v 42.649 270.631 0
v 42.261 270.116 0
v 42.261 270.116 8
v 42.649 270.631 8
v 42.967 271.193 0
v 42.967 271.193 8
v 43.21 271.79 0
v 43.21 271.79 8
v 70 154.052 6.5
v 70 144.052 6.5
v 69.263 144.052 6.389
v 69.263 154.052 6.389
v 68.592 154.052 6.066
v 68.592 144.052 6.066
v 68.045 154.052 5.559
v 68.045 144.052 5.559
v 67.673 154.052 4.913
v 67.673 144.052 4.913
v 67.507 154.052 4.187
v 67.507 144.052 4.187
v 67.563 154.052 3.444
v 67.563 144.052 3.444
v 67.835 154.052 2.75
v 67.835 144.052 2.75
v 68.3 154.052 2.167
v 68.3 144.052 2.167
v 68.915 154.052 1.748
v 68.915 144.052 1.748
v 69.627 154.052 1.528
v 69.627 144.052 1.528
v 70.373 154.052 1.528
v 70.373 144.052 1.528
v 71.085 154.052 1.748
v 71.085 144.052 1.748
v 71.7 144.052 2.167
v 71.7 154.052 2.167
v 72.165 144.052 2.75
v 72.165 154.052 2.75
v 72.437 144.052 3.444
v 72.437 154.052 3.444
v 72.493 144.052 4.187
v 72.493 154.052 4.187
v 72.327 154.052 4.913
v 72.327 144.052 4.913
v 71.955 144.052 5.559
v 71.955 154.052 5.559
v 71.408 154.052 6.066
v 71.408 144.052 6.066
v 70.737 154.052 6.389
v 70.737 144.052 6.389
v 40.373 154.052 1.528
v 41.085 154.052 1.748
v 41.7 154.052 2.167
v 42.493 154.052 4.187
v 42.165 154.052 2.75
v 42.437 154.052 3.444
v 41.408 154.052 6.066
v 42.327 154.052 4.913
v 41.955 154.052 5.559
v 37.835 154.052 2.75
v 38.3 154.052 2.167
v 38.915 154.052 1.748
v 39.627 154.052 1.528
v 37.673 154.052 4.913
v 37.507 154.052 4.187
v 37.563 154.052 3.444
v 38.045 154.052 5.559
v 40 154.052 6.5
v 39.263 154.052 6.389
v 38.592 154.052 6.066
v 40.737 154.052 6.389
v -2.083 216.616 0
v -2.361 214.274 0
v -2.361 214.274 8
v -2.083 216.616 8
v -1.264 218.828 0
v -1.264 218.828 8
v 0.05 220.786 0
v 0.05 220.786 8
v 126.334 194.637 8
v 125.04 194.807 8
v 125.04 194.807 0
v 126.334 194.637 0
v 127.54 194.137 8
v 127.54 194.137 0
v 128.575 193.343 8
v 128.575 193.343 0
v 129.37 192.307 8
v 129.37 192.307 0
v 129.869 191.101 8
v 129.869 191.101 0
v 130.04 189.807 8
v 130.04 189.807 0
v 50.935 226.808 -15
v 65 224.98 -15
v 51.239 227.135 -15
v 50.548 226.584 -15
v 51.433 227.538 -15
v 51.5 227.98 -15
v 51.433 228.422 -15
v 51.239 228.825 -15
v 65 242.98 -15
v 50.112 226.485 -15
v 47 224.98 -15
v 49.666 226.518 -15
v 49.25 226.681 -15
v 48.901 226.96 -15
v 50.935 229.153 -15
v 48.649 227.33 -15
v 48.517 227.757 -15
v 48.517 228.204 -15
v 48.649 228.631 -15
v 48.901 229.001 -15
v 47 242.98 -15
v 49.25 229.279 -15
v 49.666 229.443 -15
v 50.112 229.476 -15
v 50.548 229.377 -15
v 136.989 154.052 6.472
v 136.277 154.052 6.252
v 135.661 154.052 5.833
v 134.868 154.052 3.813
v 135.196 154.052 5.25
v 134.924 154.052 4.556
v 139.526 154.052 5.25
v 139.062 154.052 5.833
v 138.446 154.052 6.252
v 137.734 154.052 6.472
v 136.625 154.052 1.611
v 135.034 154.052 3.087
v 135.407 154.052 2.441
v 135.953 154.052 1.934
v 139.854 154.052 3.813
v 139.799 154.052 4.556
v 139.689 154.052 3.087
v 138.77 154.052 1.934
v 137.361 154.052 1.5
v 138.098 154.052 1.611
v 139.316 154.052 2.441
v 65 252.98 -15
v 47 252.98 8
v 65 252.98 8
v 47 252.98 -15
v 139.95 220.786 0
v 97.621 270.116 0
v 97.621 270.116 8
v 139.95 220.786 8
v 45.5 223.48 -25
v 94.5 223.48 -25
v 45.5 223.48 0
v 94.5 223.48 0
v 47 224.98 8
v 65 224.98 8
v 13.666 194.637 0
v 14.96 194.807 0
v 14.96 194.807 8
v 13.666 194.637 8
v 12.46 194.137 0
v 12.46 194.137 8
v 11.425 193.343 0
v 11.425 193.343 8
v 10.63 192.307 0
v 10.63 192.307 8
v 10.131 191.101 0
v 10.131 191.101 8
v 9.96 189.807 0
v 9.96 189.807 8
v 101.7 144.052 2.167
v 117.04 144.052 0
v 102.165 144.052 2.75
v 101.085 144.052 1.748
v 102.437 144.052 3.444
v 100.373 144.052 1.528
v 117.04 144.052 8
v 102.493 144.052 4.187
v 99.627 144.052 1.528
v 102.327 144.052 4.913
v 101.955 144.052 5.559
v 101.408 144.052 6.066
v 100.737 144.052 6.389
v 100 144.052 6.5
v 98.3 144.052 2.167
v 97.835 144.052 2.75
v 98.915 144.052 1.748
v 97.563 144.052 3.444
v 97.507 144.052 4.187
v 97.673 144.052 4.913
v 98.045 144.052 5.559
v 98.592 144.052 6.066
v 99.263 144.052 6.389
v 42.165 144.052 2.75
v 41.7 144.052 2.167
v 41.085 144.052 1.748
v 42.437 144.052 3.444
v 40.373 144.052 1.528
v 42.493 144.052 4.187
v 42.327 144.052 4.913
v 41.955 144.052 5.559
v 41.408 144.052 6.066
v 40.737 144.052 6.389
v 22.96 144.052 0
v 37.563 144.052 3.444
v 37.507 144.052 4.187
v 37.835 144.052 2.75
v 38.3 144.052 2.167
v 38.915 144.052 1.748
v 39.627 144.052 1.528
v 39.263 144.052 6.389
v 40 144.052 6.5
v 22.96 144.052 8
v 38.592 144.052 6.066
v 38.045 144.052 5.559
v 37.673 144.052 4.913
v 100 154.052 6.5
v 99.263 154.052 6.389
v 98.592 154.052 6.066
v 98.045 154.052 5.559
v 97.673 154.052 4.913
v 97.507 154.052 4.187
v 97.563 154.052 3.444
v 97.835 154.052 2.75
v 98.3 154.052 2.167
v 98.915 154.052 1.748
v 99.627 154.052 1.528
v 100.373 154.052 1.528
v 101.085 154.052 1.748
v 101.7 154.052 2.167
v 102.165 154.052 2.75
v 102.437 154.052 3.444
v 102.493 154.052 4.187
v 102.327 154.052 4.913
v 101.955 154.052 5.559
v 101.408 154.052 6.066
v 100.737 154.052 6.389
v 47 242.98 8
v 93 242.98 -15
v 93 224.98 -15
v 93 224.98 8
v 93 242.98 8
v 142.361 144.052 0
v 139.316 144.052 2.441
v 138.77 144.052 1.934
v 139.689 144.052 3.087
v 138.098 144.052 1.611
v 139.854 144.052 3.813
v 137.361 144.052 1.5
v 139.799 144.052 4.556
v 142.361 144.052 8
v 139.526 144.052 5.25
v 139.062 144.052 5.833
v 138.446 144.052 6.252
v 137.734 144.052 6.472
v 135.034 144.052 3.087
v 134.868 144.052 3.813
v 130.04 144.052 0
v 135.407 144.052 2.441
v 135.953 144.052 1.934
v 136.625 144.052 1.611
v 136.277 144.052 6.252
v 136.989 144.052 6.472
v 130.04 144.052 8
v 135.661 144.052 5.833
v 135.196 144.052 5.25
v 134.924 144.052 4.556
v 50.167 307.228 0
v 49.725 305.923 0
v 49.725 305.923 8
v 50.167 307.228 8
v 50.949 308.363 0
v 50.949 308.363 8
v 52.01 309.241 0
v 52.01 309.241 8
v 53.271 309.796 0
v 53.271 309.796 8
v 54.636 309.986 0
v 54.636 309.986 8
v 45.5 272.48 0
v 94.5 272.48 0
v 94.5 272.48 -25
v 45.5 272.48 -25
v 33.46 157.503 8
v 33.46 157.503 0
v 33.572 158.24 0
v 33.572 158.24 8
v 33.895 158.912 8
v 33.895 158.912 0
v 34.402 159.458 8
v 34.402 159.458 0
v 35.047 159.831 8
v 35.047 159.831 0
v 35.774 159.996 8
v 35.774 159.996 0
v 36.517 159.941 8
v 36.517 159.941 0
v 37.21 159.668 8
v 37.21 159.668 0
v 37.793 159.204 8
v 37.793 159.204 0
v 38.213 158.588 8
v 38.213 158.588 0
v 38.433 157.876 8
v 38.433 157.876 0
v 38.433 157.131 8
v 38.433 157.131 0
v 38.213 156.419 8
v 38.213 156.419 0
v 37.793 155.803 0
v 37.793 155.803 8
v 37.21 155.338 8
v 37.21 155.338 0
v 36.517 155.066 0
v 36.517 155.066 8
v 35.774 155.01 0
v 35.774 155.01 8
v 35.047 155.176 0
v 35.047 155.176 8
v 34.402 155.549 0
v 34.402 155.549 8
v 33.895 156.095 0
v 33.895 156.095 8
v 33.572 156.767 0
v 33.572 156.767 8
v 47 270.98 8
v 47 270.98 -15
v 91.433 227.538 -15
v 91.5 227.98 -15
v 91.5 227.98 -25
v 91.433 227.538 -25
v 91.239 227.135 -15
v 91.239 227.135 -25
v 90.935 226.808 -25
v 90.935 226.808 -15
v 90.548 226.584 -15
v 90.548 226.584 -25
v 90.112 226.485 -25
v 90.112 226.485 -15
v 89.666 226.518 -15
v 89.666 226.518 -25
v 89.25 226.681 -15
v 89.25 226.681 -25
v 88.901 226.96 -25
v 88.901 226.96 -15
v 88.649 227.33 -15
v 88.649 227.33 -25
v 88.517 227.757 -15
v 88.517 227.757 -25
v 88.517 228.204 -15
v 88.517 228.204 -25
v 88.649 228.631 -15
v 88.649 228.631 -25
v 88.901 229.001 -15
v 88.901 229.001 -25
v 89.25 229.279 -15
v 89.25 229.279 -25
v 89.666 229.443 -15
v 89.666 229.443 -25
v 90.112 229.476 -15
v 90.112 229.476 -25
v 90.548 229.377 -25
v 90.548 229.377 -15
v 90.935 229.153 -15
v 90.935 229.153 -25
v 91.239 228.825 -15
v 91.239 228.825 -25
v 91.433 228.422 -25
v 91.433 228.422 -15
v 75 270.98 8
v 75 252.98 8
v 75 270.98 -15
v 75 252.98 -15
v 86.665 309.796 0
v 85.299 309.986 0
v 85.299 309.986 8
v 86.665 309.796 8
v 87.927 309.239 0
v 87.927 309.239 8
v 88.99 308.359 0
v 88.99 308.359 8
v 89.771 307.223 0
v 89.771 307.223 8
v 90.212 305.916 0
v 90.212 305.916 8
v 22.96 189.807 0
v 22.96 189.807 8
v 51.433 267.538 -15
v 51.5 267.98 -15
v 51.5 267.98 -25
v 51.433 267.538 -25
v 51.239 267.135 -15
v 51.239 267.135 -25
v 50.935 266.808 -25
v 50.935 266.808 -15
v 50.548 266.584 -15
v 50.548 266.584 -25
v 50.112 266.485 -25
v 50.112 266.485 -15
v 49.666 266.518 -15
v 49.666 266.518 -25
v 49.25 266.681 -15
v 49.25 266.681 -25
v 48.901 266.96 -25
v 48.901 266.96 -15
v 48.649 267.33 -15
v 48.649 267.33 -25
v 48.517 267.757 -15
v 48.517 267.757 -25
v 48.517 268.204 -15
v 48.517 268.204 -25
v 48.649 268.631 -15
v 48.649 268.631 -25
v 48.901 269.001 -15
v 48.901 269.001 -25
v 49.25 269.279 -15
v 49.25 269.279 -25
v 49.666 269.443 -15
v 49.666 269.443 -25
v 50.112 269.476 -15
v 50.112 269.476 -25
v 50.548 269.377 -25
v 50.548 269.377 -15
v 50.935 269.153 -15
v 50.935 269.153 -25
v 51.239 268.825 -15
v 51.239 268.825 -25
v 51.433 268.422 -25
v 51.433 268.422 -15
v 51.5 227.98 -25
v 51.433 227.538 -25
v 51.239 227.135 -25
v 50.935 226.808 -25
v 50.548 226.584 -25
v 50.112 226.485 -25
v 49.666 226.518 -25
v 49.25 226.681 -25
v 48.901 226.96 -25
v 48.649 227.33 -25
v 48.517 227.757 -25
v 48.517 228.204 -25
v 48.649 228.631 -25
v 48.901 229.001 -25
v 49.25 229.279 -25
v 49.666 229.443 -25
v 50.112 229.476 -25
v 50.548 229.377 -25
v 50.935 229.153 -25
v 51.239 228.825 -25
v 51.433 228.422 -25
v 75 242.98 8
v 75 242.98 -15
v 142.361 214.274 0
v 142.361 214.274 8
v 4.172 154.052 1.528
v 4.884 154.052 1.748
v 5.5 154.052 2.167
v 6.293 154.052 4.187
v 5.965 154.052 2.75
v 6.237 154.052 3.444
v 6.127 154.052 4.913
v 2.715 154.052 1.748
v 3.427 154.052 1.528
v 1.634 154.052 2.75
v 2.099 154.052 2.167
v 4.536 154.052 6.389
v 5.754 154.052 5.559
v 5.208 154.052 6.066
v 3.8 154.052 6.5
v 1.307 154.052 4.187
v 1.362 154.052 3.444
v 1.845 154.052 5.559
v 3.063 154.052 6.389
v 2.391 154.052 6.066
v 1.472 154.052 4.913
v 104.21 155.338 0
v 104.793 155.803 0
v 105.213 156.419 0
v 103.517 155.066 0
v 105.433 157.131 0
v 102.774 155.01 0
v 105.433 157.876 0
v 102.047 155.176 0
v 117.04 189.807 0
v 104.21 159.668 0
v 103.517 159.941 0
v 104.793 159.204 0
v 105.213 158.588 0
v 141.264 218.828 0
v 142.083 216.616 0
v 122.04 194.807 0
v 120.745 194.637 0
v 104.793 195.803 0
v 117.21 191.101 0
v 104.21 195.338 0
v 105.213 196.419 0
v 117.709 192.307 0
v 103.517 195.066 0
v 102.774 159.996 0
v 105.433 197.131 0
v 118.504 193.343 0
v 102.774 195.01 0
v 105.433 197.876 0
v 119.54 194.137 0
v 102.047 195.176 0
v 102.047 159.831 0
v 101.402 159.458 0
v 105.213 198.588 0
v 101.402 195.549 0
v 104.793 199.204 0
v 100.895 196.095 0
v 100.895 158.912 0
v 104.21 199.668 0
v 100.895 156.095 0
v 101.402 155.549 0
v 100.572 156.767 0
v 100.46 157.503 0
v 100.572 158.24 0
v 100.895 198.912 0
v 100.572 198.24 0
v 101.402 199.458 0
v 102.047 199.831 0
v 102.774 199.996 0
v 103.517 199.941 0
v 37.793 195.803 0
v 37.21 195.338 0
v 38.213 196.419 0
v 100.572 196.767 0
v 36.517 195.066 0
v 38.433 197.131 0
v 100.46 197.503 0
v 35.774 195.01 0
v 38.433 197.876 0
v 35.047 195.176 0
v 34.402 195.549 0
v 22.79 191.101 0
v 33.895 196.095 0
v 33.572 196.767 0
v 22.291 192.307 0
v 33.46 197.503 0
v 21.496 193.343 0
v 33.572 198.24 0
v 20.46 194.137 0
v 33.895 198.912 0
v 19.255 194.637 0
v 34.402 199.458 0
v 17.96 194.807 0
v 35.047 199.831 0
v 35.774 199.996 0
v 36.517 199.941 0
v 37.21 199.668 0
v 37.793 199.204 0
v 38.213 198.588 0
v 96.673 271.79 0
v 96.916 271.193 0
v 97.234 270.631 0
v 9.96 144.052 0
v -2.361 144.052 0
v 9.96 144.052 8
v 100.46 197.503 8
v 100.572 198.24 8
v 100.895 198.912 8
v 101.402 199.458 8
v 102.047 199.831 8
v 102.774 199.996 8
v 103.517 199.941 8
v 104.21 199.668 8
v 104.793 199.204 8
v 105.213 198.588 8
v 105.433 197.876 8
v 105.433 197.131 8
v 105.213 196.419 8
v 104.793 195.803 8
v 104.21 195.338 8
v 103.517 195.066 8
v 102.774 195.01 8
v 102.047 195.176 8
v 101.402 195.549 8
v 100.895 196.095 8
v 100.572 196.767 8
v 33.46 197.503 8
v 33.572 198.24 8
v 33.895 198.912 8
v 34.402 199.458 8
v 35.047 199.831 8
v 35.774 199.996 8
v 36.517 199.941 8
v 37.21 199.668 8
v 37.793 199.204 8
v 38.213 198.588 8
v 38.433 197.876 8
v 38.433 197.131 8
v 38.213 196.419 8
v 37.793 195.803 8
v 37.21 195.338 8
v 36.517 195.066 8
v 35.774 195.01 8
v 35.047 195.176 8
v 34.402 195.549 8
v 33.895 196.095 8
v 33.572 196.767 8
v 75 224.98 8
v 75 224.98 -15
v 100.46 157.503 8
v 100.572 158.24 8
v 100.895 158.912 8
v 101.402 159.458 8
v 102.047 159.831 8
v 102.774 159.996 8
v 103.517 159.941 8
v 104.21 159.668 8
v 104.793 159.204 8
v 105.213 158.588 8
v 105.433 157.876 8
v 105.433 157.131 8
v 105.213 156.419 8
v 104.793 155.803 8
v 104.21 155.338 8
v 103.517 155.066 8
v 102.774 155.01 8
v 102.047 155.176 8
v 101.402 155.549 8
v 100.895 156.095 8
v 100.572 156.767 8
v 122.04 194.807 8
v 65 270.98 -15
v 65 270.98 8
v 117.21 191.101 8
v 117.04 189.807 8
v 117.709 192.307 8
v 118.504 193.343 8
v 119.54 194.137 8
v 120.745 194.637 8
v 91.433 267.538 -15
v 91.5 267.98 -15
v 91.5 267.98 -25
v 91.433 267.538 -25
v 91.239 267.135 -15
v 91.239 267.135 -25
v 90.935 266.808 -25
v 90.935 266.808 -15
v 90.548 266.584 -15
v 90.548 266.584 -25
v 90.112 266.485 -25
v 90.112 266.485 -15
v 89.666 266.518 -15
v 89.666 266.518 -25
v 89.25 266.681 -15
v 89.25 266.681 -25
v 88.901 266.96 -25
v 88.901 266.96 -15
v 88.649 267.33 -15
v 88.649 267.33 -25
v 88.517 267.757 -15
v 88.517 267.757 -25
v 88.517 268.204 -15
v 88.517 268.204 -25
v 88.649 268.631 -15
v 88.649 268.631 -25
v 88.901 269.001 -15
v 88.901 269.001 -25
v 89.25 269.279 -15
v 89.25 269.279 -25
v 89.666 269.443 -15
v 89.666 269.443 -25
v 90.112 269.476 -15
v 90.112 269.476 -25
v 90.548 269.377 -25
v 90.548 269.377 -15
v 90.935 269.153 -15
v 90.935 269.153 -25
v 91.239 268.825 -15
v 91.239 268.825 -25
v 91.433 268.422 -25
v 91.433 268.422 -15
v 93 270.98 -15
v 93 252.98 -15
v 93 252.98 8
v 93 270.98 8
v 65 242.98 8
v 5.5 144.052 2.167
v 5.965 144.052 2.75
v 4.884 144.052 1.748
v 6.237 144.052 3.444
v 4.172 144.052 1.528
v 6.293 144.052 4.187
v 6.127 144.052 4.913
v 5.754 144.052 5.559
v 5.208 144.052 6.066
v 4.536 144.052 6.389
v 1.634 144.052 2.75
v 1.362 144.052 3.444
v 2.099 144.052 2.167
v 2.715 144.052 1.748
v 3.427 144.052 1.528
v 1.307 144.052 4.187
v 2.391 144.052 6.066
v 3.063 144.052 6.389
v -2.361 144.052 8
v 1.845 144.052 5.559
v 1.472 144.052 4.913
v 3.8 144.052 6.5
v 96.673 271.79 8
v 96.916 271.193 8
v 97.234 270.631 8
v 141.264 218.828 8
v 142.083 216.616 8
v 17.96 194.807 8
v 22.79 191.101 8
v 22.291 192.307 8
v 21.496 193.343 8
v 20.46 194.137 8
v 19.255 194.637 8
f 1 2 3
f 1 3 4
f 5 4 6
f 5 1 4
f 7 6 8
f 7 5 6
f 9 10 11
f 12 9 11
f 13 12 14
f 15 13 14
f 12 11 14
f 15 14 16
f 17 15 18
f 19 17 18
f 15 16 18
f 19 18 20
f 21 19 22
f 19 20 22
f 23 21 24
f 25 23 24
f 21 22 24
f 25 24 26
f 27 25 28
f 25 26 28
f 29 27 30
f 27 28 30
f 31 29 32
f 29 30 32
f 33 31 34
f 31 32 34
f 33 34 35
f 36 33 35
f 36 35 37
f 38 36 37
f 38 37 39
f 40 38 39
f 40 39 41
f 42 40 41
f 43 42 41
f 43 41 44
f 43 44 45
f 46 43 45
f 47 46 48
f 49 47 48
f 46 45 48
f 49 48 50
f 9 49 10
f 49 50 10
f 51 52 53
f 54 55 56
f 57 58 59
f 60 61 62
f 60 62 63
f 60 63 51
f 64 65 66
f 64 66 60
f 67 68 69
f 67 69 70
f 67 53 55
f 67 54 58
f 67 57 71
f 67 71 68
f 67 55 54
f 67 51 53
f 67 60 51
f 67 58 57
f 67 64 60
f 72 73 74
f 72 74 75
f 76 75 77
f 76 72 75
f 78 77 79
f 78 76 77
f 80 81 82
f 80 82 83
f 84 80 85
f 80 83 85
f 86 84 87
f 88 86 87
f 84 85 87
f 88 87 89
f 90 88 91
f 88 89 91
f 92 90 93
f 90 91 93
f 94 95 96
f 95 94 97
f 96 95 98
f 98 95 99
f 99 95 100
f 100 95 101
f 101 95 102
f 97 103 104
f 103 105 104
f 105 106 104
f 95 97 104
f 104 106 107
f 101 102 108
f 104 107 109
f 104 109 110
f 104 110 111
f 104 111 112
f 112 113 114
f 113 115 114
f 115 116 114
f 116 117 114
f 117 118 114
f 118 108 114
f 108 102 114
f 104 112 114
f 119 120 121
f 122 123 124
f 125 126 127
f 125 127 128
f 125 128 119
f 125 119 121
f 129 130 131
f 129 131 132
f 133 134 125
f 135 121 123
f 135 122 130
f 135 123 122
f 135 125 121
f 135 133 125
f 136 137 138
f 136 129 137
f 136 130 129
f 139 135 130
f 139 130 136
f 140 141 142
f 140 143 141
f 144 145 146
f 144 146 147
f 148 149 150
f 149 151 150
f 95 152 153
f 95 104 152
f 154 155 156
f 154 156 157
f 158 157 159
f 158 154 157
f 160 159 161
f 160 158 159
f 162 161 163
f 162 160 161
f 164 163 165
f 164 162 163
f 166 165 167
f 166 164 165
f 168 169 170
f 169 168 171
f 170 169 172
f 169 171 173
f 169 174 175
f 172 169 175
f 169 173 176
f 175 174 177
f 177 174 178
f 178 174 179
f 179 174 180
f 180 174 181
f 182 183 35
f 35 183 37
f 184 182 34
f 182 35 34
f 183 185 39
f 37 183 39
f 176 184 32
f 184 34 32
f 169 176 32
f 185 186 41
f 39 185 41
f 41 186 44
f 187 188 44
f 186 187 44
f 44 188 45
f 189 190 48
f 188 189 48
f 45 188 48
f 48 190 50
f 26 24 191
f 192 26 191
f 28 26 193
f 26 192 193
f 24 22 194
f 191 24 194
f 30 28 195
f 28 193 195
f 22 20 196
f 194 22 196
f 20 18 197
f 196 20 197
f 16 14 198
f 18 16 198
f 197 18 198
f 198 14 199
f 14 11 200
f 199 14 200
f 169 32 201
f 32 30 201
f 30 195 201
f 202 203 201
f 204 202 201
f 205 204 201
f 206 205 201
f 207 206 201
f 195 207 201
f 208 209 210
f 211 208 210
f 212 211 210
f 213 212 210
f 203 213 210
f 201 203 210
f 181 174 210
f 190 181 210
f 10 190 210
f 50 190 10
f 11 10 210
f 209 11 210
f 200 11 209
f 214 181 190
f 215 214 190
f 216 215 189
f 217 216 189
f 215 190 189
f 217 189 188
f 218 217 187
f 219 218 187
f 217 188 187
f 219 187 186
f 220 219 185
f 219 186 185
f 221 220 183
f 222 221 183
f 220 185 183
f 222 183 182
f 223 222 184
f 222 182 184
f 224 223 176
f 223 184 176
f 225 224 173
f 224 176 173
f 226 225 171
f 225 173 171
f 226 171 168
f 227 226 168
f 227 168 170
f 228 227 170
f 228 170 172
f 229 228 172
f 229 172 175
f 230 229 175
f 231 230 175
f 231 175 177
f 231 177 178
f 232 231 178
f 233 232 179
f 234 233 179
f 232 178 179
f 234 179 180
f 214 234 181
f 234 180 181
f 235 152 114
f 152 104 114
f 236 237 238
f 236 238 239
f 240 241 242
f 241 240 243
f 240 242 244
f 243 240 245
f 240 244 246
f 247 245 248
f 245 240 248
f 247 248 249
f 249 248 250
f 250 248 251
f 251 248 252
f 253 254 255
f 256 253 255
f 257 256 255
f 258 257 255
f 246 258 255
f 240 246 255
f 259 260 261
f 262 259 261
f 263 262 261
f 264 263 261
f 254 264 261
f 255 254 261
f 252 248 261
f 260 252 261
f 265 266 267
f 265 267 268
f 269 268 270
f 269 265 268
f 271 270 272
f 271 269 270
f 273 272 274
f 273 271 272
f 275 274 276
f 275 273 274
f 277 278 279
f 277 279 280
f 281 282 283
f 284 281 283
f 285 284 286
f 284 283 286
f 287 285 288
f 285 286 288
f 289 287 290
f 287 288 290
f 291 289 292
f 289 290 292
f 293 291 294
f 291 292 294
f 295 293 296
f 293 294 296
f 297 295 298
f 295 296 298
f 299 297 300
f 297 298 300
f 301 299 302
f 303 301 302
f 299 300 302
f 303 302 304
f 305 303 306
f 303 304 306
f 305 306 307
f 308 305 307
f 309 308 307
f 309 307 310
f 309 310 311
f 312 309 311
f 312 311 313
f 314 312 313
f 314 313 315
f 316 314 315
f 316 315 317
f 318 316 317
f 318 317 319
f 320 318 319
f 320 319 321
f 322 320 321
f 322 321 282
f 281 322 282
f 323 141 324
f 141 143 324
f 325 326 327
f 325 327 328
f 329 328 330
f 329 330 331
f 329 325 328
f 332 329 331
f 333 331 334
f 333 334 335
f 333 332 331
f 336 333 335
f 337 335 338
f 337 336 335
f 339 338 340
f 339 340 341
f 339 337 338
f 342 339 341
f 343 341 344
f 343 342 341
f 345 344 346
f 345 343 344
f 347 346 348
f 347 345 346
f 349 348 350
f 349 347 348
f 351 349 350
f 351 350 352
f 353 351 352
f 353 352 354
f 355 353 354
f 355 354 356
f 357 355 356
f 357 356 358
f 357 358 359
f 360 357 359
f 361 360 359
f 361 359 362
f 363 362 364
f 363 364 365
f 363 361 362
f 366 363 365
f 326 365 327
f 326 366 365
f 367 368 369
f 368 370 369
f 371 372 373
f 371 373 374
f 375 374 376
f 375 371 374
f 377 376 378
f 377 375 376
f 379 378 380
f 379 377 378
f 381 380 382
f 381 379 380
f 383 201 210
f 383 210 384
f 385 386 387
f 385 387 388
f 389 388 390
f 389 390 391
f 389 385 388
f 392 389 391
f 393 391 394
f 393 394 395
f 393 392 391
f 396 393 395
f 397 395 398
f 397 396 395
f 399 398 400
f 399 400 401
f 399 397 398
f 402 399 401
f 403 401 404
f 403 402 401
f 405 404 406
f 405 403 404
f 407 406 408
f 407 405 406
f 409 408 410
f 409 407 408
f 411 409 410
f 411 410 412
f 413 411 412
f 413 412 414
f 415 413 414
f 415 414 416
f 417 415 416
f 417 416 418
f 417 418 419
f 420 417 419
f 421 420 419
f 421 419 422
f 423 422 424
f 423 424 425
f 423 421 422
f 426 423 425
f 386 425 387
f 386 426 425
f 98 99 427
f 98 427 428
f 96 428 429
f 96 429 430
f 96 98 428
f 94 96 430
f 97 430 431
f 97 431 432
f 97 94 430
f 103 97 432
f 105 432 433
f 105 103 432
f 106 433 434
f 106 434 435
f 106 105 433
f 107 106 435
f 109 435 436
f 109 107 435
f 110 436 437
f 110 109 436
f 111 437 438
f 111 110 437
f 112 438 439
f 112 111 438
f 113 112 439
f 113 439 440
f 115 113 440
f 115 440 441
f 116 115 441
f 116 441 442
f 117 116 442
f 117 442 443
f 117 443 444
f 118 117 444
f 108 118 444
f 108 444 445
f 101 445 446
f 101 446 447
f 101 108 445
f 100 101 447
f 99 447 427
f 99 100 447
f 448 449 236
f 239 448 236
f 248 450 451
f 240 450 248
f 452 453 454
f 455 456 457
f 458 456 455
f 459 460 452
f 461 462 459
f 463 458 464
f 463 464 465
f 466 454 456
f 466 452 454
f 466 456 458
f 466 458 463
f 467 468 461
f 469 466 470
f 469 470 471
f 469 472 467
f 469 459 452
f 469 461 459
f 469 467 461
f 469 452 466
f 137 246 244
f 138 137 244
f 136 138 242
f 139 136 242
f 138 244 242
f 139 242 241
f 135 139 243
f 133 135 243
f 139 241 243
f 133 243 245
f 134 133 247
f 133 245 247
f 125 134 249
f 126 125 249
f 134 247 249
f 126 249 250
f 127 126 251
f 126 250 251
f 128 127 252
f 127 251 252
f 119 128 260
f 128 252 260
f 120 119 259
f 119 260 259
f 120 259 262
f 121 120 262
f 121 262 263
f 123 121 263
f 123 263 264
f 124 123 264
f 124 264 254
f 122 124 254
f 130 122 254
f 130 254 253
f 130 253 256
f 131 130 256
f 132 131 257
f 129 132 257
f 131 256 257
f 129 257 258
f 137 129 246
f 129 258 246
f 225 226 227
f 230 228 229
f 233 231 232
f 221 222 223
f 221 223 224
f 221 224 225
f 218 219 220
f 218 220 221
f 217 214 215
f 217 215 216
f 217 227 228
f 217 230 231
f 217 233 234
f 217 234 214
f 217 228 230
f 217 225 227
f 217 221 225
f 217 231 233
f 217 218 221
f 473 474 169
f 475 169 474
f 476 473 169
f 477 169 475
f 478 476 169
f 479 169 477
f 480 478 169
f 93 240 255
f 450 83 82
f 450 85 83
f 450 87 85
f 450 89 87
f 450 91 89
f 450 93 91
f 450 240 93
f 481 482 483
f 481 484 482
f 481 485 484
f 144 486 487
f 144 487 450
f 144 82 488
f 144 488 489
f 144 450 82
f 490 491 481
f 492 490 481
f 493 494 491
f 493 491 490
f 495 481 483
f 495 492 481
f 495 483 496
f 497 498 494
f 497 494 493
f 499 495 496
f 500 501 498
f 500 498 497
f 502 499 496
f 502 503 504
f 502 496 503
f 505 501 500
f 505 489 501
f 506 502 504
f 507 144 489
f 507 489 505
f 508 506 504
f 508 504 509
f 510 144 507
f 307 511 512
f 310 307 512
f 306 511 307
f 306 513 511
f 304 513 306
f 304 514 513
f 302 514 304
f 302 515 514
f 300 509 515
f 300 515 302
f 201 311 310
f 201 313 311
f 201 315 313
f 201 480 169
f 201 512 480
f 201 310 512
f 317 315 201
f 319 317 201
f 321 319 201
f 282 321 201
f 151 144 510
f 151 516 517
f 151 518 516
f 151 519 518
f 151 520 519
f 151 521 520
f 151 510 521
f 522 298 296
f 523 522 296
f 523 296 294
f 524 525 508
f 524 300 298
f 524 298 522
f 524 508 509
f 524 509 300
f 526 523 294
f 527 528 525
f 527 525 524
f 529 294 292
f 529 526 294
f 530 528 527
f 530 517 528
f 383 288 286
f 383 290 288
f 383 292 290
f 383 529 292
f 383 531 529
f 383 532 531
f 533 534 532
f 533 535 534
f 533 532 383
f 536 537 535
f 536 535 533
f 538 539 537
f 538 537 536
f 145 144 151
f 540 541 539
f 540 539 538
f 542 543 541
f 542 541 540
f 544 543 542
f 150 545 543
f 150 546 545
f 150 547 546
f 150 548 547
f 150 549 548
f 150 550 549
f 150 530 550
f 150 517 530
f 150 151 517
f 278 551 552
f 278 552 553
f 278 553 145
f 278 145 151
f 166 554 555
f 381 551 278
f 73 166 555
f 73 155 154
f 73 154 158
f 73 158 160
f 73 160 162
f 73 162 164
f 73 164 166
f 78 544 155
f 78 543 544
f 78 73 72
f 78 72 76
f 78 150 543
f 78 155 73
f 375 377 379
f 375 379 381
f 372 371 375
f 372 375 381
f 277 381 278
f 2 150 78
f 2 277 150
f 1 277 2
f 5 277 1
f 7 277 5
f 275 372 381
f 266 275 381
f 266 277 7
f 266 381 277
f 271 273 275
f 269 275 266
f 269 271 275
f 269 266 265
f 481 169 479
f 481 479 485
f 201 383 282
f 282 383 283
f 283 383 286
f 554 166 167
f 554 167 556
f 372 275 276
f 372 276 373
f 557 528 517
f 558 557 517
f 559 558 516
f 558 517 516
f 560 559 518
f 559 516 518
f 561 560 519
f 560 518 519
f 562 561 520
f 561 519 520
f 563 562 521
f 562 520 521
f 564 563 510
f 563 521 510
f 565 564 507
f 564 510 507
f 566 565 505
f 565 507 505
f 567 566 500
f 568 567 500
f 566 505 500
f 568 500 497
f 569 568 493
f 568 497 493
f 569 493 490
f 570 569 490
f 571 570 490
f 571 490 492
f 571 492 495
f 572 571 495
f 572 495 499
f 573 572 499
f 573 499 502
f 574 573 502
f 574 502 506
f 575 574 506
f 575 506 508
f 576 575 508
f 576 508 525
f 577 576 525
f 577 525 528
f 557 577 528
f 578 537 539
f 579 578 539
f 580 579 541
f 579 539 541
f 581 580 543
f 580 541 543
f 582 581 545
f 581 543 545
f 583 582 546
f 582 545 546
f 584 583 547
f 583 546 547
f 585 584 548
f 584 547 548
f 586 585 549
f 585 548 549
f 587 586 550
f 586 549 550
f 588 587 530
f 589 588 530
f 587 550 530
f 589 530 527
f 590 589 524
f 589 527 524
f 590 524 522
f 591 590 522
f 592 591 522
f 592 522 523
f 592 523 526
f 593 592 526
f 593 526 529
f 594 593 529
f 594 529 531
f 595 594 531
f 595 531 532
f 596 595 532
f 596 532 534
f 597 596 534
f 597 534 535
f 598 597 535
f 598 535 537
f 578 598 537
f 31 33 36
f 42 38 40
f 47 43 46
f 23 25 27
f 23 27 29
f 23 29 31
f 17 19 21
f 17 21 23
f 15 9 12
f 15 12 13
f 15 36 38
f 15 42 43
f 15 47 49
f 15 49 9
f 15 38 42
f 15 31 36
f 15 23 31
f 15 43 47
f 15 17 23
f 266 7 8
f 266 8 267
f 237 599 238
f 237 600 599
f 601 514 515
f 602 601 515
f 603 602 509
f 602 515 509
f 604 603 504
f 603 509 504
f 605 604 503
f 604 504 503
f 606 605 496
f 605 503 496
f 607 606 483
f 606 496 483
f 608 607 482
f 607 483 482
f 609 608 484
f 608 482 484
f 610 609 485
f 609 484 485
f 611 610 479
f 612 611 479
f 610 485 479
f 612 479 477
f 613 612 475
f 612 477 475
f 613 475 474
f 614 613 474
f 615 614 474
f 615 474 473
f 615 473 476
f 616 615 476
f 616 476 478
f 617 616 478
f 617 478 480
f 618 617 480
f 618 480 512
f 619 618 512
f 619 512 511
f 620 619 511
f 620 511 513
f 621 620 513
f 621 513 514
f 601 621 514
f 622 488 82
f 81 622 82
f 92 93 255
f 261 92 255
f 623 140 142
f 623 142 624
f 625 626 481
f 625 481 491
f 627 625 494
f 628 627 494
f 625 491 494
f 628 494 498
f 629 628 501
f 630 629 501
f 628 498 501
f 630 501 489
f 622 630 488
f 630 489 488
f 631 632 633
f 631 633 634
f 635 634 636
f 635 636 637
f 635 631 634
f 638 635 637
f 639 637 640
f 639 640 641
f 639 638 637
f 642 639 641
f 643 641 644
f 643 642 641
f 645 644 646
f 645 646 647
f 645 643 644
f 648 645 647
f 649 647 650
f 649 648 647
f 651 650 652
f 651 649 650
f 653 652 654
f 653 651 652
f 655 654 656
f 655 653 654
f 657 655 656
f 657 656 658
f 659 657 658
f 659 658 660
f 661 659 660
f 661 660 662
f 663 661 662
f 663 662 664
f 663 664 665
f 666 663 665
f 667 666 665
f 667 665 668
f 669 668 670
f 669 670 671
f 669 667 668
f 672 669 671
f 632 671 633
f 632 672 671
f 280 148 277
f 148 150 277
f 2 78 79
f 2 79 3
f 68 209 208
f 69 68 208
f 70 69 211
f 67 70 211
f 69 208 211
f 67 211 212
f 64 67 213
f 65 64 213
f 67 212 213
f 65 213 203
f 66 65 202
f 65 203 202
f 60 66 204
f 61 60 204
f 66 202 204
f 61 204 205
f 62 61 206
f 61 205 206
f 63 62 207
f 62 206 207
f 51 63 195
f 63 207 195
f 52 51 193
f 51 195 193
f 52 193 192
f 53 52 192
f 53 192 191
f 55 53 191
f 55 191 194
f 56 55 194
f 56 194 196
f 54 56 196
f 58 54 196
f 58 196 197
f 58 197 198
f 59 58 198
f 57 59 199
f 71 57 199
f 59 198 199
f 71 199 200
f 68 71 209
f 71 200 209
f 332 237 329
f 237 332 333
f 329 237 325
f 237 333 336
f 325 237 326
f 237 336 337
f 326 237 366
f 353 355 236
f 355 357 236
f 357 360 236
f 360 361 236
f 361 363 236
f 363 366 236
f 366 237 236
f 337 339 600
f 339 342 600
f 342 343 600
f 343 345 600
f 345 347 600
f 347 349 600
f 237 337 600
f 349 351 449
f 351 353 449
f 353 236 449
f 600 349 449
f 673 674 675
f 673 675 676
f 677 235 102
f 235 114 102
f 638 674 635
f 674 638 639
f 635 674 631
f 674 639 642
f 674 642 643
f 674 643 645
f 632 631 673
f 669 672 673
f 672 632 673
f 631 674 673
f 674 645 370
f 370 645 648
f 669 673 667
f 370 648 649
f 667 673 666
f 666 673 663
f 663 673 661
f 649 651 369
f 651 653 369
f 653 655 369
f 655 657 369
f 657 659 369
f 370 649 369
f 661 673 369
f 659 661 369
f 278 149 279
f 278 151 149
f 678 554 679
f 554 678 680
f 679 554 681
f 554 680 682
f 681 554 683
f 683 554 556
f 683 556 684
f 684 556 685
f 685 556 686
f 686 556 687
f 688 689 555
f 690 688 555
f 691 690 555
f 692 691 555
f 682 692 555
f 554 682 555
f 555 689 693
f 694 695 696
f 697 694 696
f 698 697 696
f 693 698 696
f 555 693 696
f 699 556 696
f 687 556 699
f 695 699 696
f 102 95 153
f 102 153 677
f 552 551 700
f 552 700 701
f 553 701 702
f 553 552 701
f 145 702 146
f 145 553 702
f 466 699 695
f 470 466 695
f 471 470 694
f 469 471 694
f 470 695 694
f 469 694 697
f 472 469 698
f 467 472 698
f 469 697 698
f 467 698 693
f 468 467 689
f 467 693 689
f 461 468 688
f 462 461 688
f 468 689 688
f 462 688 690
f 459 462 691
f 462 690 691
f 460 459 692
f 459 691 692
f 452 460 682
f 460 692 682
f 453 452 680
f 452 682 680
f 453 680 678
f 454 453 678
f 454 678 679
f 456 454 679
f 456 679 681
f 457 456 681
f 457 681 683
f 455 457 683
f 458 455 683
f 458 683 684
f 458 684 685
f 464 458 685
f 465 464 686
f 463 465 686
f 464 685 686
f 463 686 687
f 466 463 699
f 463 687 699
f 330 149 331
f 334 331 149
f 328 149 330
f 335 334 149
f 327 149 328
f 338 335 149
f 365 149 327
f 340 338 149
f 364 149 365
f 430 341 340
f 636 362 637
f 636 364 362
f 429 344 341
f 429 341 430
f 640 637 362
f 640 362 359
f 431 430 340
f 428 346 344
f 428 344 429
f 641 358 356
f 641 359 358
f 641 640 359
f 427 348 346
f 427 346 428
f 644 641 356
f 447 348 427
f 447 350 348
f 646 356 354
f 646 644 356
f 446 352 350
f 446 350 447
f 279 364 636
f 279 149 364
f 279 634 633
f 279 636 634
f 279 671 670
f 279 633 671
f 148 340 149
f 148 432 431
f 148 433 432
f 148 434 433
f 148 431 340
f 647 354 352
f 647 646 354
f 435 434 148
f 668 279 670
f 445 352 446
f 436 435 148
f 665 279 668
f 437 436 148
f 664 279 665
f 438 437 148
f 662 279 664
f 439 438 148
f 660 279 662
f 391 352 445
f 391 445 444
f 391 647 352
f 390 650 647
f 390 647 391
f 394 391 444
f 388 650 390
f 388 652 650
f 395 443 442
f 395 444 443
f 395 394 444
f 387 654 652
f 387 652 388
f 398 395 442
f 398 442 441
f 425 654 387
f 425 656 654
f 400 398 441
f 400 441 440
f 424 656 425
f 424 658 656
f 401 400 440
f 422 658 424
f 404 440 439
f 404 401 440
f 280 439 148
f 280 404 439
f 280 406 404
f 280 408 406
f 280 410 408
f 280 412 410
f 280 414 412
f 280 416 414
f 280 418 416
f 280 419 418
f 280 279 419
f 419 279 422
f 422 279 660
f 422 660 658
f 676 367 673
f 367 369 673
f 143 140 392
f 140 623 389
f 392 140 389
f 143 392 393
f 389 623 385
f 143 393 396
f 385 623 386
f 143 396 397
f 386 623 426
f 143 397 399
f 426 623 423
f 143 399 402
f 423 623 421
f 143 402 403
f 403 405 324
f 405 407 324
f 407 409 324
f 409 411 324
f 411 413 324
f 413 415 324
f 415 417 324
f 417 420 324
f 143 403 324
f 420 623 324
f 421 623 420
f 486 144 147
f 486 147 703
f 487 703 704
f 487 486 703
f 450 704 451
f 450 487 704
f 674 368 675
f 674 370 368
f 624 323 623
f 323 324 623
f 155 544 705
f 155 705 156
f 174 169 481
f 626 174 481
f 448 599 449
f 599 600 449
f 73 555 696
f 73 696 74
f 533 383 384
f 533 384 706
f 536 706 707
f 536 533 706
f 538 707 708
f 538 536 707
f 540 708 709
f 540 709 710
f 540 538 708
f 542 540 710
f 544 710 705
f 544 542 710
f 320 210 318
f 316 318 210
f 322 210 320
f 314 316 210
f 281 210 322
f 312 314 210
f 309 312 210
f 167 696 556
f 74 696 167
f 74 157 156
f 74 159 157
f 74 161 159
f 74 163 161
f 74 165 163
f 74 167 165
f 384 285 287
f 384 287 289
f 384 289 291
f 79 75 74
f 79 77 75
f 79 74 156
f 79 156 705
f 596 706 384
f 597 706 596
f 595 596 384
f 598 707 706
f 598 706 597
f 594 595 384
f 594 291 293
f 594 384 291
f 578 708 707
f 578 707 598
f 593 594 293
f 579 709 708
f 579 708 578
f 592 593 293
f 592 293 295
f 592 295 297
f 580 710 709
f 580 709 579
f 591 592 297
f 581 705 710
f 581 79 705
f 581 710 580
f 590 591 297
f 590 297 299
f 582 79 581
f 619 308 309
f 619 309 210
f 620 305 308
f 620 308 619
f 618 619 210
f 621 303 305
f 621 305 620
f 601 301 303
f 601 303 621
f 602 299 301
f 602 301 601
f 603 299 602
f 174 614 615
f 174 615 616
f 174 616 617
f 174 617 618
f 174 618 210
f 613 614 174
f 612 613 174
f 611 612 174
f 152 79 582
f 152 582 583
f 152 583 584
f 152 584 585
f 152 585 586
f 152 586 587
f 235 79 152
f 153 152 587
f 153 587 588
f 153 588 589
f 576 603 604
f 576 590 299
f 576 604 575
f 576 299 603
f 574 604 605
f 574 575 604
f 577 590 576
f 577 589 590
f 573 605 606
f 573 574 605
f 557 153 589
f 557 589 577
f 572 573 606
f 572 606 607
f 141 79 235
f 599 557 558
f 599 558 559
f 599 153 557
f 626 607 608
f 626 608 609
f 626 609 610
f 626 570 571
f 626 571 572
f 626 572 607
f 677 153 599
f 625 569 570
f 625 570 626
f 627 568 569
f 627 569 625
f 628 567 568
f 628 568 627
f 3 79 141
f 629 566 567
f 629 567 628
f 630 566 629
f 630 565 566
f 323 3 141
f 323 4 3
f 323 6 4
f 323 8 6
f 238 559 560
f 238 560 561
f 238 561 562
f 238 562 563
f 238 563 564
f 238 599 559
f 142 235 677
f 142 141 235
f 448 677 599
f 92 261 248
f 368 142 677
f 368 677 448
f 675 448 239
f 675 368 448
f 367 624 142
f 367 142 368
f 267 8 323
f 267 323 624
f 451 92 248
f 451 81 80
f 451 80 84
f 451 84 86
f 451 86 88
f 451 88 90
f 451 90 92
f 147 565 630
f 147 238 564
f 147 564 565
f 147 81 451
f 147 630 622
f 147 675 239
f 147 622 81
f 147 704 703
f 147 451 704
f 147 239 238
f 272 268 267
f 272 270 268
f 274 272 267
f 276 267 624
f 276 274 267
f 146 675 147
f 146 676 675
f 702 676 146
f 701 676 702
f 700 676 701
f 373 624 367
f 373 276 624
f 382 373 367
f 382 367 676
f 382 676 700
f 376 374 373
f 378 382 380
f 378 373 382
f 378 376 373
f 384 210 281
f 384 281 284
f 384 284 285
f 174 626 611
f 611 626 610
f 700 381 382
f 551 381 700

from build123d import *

# Parameters (mm, degrees)
BOSS_EXTRUDE1_DEPTH    = 8
SPLIT1_SURFACE_1_BACK  = 343.199
SPLIT1_SURFACE_1_DEPTH = 686.398
SPLIT1_SURFACE_2_BACK  = 343.199
SPLIT1_SURFACE_2_DEPTH = 686.398
SKETCH5_R              = 2.5
CUT_EXTRUDE6_DEPTH     = 5.2
SKETCH4_R              = 2.5
CUT_EXTRUDE7_DEPTH     = 10
SKETCH6_R              = 1.5
CUT_EXTRUDE8_DEPTH     = 342.206659287
SKETCH7_W              = 49
SKETCH7_H              = 49
SKETCH7_W_2            = 18
SKETCH7_H_2            = 18
BOSS_EXTRUDE2_DEPTH    = 15
SKETCH8_W              = 49
SKETCH8_H              = 49
SKETCH8_R              = 1.5
BOSS_EXTRUDE3_DEPTH    = 10
SKETCH9_W              = 49
SKETCH9_H              = 49
CUT_EXTRUDE9_DEPTH     = 8
SKETCH10_W             = 49
SKETCH10_H             = 49
SKETCH10_W_2           = 18
SKETCH10_H_2           = 18
BOSS_EXTRUDE4_DEPTH    = 8
SKETCH12_R             = 2.5
CUT_EXTRUDE10_DEPTH    = 343.027753759


with BuildPart() as part:
    # Sketch1 → Boss-Extrude1 (new body)
    with BuildSketch(Plane.XY):
        with BuildLine():
            Line((70, 309.985818768), (85.299227191, 309.985818768))
            ThreePointArc((85.299227191, 309.985818768), (88.489017574, 308.836174247), (90.211957942, 305.915913694))
            Line((90.211957942, 305.915913694), (96.672728921, 271.790334282))
            ThreePointArc((96.672728921, 271.790334282), (97.06575438, 270.906904614), (97.621470019, 270.115641625))
            Line((97.621470019, 270.115641625), (139.950460317, 220.786053348))
            ThreePointArc((139.950460317, 220.786053348), (141.739336996, 217.746026552), (142.361429131, 214.274017901))
            Line((142.361429131, 214.274017901), (142.361429131, 30.859943174))
            ThreePointArc((142.361429131, 30.859943174), (140.896963037, 27.324409268), (137.361429131, 25.859943174))
            Line((137.361429131, 25.859943174), (114.717190871, 25.782318449))
            ThreePointArc((114.717190871, 25.782318449), (112.681998989, 25.341726514), (111.002773989, 24.110332733))
            Line((111.002773989, 24.110332733), (89.38285929, 0))
            Line((89.38285929, 0), (50.5, 0))
            Line((50.5, 0), (28.997226011, 24.110332733))
            ThreePointArc((28.997226011, 24.110332733), (27.318001011, 25.341726514), (25.282809129, 25.782318449))
            Line((25.282809129, 25.782318449), (2.638570869, 25.859943174))
            ThreePointArc((2.638570869, 25.859943174), (-0.896963037, 27.324409268), (-2.361429131, 30.859943174))
            Line((-2.361429131, 30.859943174), (-2.361429131, 214.274017901))
            ThreePointArc((-2.361429131, 214.274017901), (-1.739336996, 217.746026552), (0.049539683, 220.786053348))
            Line((0.049539683, 220.786053348), (42.261389271, 270.115641625))
            ThreePointArc((42.261389271, 270.115641625), (42.81710491, 270.906904614), (43.210130369, 271.790334282))
            Line((43.210130369, 271.790334282), (49.724618218, 305.923183314))
            ThreePointArc((49.724618218, 305.923183314), (51.449026762, 308.838533573), (54.635967087, 309.985818768))
            Line((54.635967087, 309.985818768), (70, 309.985818768))
        make_face()
        with BuildLine():
            Line((15.218798766, 54.807228462), (17.702103505, 54.807228462))
            ThreePointArc((17.702103505, 54.807228462), (21.420312934, 56.347361236), (22.960445707, 60.065570665))
            Line((22.960445707, 60.065570665), (22.960445707, 189.807228462))
            ThreePointArc((22.960445707, 189.807228462), (21.495979613, 193.342762368), (17.960445707, 194.807228462))
            Line((17.960445707, 194.807228462), (14.960456564, 194.807228462))
            ThreePointArc((14.960456564, 194.807228462), (11.424922658, 193.342762368), (9.960456564, 189.807228462))
            Line((9.960456564, 189.807228462), (9.960456564, 60.065570665))
            ThreePointArc((9.960456564, 60.065570665), (11.500589337, 56.347361236), (15.218798766, 54.807228462))
        make_face(mode=Mode.SUBTRACT)
        with BuildLine():
            Line((125.039543436, 54.807228462), (122.039554293, 54.807228462))
            ThreePointArc((122.039554293, 54.807228462), (118.504020387, 56.271694556), (117.039554293, 59.807228462))
            Line((117.039554293, 59.807228462), (117.039554293, 189.807228462))
            ThreePointArc((117.039554293, 189.807228462), (118.504020387, 193.342762368), (122.039554293, 194.807228462))
            Line((122.039554293, 194.807228462), (125.039543436, 194.807228462))
            ThreePointArc((125.039543436, 194.807228462), (128.575077342, 193.342762368), (130.039543436, 189.807228462))
            Line((130.039543436, 189.807228462), (130.039543436, 59.807228462))
            ThreePointArc((130.039543436, 59.807228462), (128.575077342, 56.271694556), (125.039543436, 54.807228462))
        make_face(mode=Mode.SUBTRACT)
    extrude(amount=BOSS_EXTRUDE1_DEPTH)


with BuildPart() as body_2:
    # Split1: the piece behind the surface
    add(part.part)
    # Split1 surface: a surface, the sketch's curves swept straight by 686.398 mm
    with BuildLine(Plane(origin=(0, 0, 0), x_dir=(-1, 0, 0), z_dir=(0, 0, -1)).offset(-SPLIT1_SURFACE_1_BACK), mode=Mode.PRIVATE) as split1_surface_1_path:
        Line((-142.361429131, 144.05225917), (2.361429131, 144.05225917))
    split1_surface_1 = Shell.extrude(split1_surface_1_path.wire(), (0 * SPLIT1_SURFACE_1_DEPTH, 0 * SPLIT1_SURFACE_1_DEPTH, -1 * SPLIT1_SURFACE_1_DEPTH))
    split(bisect_by=split1_surface_1, keep=Keep.BOTTOM)

    # Sketch5 → Cut-Extrude6 (cut)
    with BuildSketch(Plane(origin=(0, 144.05225917, -115.359943174), x_dir=(1, 0, 0), z_dir=(0, -1, 0))):
        with Locations(Location((70, 119.359943174, 0), (0, 0, 270))):
            Circle(SKETCH5_R)
        with Locations(Location((40, 119.359943174, 0), (0, 0, 270))):
            Circle(SKETCH5_R)
        with Locations(Location((2.638570869, 119.359943174, 0), (0, 0, 270))):
            Circle(SKETCH5_R)
    extrude(amount=CUT_EXTRUDE6_DEPTH, mode=Mode.SUBTRACT)


with BuildPart() as part_1:
    add(part.part)

    # Split1: split by a surface, the side it looks to stays
    # Split1 surface: a surface, the sketch's curves swept straight by 686.398 mm
    with BuildLine(Plane(origin=(0, 0, 0), x_dir=(-1, 0, 0), z_dir=(0, 0, -1)).offset(-SPLIT1_SURFACE_2_BACK), mode=Mode.PRIVATE) as split1_surface_2_path:
        Line((-142.361429131, 144.05225917), (2.361429131, 144.05225917))
    split1_surface_2 = Shell.extrude(split1_surface_2_path.wire(), (0 * SPLIT1_SURFACE_2_DEPTH, 0 * SPLIT1_SURFACE_2_DEPTH, -1 * SPLIT1_SURFACE_2_DEPTH))
    split(bisect_by=split1_surface_2, keep=Keep.TOP)

    # Sketch4 → Cut-Extrude7 (cut)
    with BuildSketch(Plane(origin=(0, 144.05225917, 0), x_dir=(-1, 0, 0), z_dir=(0, -1, 0))):
        with Locations(Location((-70, -4, 0), (0, 0, 270))):
            Circle(SKETCH4_R)
        with Locations(Location((-40, -4, 0), (0, 0, 270))):
            Circle(SKETCH4_R)
        with Locations(Location((-100, -4, 0), (0, 0, 270))):
            Circle(SKETCH4_R)
        with Locations(Location((-137.361429131, -4, 0), (0, 0, 90))):
            Circle(SKETCH4_R)
        with Locations(Location((-3.799513716, -4, 0), (0, 0, 270))):
            Circle(SKETCH4_R)
    extrude(amount=-CUT_EXTRUDE7_DEPTH, mode=Mode.SUBTRACT)

    # Sketch6 → Cut-Extrude8 (cut, through all)
    with BuildSketch(Plane.XY.offset(8)):
        with Locations((50.000130369, 267.980334282)):
            Circle(SKETCH6_R)
        with Locations((90.000130369, 267.980334282)):
            Circle(SKETCH6_R)
        with Locations((90.000130369, 227.980334282)):
            Circle(SKETCH6_R)
        with Locations((50.000130369, 227.980334282)):
            Circle(SKETCH6_R)
    extrude(amount=-CUT_EXTRUDE8_DEPTH, mode=Mode.SUBTRACT)

    # Sketch7 → Boss-Extrude2 (add)
    with BuildSketch(Plane(origin=(0, 0, 0), x_dir=(-1, 0, 0), z_dir=(0, 0, -1))):
        with Locations((-70.000130369, 247.980334282)):
            Rectangle(SKETCH7_W, SKETCH7_H)
        with Locations((-56.000130369, 261.980334282)):
            Rectangle(SKETCH7_W_2, SKETCH7_H_2, mode=Mode.SUBTRACT)
        with Locations((-84.000130369, 261.980334282)):
            Rectangle(SKETCH7_W_2, SKETCH7_H_2, mode=Mode.SUBTRACT)
        with Locations((-84.000130369, 233.980334282)):
            Rectangle(SKETCH7_W_2, SKETCH7_H_2, mode=Mode.SUBTRACT)
        with Locations((-56.000130369, 233.980334282)):
            Rectangle(SKETCH7_W_2, SKETCH7_H_2, mode=Mode.SUBTRACT)
    extrude(amount=BOSS_EXTRUDE2_DEPTH)

    # Sketch8 → Boss-Extrude3 (add)
    with BuildSketch(Plane(origin=(0, 0, -15), x_dir=(-1, 0, 0), z_dir=(0, 0, -1))):
        with Locations((-70.000130369, 247.980334282)):
            Rectangle(SKETCH8_W, SKETCH8_H)
        with Locations(Location((-50.000130369, 267.980334282, 0), (0, 0, 180))):
            Circle(SKETCH8_R, mode=Mode.SUBTRACT)
        with Locations(Location((-90.000130369, 267.980334282, 0), (0, 0, 180))):
            Circle(SKETCH8_R, mode=Mode.SUBTRACT)
        with Locations(Location((-50.000130369, 227.980334282, 0), (0, 0, 180))):
            Circle(SKETCH8_R, mode=Mode.SUBTRACT)
        with Locations(Location((-90.000130369, 227.980334282, 0), (0, 0, 180))):
            Circle(SKETCH8_R, mode=Mode.SUBTRACT)
    extrude(amount=BOSS_EXTRUDE3_DEPTH)

    # Sketch9 → Cut-Extrude9 (cut)
    with BuildSketch(Plane.XY.offset(8)):
        with Locations((70.000130369, 247.980334282)):
            Rectangle(SKETCH9_W, SKETCH9_H)
    extrude(amount=-CUT_EXTRUDE9_DEPTH, mode=Mode.SUBTRACT)


with BuildPart() as cut_extrude9_piece_1:
    # of the separate pieces the step leaves, piece 1, a body of its own (cut_extrude9_pieces)
    add(part_1.part.solids().sort_by_distance((49.724618218, 305.923183314, 0))[0])



with BuildPart() as cut_extrude9_piece_2:
    # of the separate pieces the step leaves, piece 2, a body of its own (cut_extrude9_pieces)
    add(part_1.part.solids().sort_by_distance((45.500130369, 223.480334282, -25))[0])


with BuildPart() as cut_extrude9_piece_1_1:
    add(cut_extrude9_piece_1.part)

    add(cut_extrude9_piece_2.part)  # Boss-Extrude4 merges Cut-Extrude9 piece 2
    # Sketch10 → Boss-Extrude4 (add)
    with BuildSketch(Plane.XY):
        with Locations((70.000130369, 247.980334282)):
            Rectangle(SKETCH10_W, SKETCH10_H)
        with Locations((84.000130369, 261.980334282)):
            Rectangle(SKETCH10_W_2, SKETCH10_H_2, mode=Mode.SUBTRACT)
        with Locations((56.000130369, 261.980334282)):
            Rectangle(SKETCH10_W_2, SKETCH10_H_2, mode=Mode.SUBTRACT)
        with Locations((56.000130369, 233.980334282)):
            Rectangle(SKETCH10_W_2, SKETCH10_H_2, mode=Mode.SUBTRACT)
        with Locations((84.000130369, 233.980334282)):
            Rectangle(SKETCH10_W_2, SKETCH10_H_2, mode=Mode.SUBTRACT)
    extrude(amount=BOSS_EXTRUDE4_DEPTH)

    # Sketch12 → Cut-Extrude10 (cut, through all)
    with BuildSketch(Plane(origin=(0, 0, 0), x_dir=(-1, 0, 0), z_dir=(0, 0, -1))):
        with Locations((-102.960445707, 197.503395095)):
            Circle(SKETCH12_R)
        with Locations((-35.960445707, 197.503395095)):
            Circle(SKETCH12_R)
        with Locations((-35.960445707, 157.503395095)):
            Circle(SKETCH12_R)
        with Locations((-102.960445707, 157.503395095)):
            Circle(SKETCH12_R)
    extrude(amount=-CUT_EXTRUDE10_DEPTH, mode=Mode.SUBTRACT)


solid = cut_extrude9_piece_1_1.part
